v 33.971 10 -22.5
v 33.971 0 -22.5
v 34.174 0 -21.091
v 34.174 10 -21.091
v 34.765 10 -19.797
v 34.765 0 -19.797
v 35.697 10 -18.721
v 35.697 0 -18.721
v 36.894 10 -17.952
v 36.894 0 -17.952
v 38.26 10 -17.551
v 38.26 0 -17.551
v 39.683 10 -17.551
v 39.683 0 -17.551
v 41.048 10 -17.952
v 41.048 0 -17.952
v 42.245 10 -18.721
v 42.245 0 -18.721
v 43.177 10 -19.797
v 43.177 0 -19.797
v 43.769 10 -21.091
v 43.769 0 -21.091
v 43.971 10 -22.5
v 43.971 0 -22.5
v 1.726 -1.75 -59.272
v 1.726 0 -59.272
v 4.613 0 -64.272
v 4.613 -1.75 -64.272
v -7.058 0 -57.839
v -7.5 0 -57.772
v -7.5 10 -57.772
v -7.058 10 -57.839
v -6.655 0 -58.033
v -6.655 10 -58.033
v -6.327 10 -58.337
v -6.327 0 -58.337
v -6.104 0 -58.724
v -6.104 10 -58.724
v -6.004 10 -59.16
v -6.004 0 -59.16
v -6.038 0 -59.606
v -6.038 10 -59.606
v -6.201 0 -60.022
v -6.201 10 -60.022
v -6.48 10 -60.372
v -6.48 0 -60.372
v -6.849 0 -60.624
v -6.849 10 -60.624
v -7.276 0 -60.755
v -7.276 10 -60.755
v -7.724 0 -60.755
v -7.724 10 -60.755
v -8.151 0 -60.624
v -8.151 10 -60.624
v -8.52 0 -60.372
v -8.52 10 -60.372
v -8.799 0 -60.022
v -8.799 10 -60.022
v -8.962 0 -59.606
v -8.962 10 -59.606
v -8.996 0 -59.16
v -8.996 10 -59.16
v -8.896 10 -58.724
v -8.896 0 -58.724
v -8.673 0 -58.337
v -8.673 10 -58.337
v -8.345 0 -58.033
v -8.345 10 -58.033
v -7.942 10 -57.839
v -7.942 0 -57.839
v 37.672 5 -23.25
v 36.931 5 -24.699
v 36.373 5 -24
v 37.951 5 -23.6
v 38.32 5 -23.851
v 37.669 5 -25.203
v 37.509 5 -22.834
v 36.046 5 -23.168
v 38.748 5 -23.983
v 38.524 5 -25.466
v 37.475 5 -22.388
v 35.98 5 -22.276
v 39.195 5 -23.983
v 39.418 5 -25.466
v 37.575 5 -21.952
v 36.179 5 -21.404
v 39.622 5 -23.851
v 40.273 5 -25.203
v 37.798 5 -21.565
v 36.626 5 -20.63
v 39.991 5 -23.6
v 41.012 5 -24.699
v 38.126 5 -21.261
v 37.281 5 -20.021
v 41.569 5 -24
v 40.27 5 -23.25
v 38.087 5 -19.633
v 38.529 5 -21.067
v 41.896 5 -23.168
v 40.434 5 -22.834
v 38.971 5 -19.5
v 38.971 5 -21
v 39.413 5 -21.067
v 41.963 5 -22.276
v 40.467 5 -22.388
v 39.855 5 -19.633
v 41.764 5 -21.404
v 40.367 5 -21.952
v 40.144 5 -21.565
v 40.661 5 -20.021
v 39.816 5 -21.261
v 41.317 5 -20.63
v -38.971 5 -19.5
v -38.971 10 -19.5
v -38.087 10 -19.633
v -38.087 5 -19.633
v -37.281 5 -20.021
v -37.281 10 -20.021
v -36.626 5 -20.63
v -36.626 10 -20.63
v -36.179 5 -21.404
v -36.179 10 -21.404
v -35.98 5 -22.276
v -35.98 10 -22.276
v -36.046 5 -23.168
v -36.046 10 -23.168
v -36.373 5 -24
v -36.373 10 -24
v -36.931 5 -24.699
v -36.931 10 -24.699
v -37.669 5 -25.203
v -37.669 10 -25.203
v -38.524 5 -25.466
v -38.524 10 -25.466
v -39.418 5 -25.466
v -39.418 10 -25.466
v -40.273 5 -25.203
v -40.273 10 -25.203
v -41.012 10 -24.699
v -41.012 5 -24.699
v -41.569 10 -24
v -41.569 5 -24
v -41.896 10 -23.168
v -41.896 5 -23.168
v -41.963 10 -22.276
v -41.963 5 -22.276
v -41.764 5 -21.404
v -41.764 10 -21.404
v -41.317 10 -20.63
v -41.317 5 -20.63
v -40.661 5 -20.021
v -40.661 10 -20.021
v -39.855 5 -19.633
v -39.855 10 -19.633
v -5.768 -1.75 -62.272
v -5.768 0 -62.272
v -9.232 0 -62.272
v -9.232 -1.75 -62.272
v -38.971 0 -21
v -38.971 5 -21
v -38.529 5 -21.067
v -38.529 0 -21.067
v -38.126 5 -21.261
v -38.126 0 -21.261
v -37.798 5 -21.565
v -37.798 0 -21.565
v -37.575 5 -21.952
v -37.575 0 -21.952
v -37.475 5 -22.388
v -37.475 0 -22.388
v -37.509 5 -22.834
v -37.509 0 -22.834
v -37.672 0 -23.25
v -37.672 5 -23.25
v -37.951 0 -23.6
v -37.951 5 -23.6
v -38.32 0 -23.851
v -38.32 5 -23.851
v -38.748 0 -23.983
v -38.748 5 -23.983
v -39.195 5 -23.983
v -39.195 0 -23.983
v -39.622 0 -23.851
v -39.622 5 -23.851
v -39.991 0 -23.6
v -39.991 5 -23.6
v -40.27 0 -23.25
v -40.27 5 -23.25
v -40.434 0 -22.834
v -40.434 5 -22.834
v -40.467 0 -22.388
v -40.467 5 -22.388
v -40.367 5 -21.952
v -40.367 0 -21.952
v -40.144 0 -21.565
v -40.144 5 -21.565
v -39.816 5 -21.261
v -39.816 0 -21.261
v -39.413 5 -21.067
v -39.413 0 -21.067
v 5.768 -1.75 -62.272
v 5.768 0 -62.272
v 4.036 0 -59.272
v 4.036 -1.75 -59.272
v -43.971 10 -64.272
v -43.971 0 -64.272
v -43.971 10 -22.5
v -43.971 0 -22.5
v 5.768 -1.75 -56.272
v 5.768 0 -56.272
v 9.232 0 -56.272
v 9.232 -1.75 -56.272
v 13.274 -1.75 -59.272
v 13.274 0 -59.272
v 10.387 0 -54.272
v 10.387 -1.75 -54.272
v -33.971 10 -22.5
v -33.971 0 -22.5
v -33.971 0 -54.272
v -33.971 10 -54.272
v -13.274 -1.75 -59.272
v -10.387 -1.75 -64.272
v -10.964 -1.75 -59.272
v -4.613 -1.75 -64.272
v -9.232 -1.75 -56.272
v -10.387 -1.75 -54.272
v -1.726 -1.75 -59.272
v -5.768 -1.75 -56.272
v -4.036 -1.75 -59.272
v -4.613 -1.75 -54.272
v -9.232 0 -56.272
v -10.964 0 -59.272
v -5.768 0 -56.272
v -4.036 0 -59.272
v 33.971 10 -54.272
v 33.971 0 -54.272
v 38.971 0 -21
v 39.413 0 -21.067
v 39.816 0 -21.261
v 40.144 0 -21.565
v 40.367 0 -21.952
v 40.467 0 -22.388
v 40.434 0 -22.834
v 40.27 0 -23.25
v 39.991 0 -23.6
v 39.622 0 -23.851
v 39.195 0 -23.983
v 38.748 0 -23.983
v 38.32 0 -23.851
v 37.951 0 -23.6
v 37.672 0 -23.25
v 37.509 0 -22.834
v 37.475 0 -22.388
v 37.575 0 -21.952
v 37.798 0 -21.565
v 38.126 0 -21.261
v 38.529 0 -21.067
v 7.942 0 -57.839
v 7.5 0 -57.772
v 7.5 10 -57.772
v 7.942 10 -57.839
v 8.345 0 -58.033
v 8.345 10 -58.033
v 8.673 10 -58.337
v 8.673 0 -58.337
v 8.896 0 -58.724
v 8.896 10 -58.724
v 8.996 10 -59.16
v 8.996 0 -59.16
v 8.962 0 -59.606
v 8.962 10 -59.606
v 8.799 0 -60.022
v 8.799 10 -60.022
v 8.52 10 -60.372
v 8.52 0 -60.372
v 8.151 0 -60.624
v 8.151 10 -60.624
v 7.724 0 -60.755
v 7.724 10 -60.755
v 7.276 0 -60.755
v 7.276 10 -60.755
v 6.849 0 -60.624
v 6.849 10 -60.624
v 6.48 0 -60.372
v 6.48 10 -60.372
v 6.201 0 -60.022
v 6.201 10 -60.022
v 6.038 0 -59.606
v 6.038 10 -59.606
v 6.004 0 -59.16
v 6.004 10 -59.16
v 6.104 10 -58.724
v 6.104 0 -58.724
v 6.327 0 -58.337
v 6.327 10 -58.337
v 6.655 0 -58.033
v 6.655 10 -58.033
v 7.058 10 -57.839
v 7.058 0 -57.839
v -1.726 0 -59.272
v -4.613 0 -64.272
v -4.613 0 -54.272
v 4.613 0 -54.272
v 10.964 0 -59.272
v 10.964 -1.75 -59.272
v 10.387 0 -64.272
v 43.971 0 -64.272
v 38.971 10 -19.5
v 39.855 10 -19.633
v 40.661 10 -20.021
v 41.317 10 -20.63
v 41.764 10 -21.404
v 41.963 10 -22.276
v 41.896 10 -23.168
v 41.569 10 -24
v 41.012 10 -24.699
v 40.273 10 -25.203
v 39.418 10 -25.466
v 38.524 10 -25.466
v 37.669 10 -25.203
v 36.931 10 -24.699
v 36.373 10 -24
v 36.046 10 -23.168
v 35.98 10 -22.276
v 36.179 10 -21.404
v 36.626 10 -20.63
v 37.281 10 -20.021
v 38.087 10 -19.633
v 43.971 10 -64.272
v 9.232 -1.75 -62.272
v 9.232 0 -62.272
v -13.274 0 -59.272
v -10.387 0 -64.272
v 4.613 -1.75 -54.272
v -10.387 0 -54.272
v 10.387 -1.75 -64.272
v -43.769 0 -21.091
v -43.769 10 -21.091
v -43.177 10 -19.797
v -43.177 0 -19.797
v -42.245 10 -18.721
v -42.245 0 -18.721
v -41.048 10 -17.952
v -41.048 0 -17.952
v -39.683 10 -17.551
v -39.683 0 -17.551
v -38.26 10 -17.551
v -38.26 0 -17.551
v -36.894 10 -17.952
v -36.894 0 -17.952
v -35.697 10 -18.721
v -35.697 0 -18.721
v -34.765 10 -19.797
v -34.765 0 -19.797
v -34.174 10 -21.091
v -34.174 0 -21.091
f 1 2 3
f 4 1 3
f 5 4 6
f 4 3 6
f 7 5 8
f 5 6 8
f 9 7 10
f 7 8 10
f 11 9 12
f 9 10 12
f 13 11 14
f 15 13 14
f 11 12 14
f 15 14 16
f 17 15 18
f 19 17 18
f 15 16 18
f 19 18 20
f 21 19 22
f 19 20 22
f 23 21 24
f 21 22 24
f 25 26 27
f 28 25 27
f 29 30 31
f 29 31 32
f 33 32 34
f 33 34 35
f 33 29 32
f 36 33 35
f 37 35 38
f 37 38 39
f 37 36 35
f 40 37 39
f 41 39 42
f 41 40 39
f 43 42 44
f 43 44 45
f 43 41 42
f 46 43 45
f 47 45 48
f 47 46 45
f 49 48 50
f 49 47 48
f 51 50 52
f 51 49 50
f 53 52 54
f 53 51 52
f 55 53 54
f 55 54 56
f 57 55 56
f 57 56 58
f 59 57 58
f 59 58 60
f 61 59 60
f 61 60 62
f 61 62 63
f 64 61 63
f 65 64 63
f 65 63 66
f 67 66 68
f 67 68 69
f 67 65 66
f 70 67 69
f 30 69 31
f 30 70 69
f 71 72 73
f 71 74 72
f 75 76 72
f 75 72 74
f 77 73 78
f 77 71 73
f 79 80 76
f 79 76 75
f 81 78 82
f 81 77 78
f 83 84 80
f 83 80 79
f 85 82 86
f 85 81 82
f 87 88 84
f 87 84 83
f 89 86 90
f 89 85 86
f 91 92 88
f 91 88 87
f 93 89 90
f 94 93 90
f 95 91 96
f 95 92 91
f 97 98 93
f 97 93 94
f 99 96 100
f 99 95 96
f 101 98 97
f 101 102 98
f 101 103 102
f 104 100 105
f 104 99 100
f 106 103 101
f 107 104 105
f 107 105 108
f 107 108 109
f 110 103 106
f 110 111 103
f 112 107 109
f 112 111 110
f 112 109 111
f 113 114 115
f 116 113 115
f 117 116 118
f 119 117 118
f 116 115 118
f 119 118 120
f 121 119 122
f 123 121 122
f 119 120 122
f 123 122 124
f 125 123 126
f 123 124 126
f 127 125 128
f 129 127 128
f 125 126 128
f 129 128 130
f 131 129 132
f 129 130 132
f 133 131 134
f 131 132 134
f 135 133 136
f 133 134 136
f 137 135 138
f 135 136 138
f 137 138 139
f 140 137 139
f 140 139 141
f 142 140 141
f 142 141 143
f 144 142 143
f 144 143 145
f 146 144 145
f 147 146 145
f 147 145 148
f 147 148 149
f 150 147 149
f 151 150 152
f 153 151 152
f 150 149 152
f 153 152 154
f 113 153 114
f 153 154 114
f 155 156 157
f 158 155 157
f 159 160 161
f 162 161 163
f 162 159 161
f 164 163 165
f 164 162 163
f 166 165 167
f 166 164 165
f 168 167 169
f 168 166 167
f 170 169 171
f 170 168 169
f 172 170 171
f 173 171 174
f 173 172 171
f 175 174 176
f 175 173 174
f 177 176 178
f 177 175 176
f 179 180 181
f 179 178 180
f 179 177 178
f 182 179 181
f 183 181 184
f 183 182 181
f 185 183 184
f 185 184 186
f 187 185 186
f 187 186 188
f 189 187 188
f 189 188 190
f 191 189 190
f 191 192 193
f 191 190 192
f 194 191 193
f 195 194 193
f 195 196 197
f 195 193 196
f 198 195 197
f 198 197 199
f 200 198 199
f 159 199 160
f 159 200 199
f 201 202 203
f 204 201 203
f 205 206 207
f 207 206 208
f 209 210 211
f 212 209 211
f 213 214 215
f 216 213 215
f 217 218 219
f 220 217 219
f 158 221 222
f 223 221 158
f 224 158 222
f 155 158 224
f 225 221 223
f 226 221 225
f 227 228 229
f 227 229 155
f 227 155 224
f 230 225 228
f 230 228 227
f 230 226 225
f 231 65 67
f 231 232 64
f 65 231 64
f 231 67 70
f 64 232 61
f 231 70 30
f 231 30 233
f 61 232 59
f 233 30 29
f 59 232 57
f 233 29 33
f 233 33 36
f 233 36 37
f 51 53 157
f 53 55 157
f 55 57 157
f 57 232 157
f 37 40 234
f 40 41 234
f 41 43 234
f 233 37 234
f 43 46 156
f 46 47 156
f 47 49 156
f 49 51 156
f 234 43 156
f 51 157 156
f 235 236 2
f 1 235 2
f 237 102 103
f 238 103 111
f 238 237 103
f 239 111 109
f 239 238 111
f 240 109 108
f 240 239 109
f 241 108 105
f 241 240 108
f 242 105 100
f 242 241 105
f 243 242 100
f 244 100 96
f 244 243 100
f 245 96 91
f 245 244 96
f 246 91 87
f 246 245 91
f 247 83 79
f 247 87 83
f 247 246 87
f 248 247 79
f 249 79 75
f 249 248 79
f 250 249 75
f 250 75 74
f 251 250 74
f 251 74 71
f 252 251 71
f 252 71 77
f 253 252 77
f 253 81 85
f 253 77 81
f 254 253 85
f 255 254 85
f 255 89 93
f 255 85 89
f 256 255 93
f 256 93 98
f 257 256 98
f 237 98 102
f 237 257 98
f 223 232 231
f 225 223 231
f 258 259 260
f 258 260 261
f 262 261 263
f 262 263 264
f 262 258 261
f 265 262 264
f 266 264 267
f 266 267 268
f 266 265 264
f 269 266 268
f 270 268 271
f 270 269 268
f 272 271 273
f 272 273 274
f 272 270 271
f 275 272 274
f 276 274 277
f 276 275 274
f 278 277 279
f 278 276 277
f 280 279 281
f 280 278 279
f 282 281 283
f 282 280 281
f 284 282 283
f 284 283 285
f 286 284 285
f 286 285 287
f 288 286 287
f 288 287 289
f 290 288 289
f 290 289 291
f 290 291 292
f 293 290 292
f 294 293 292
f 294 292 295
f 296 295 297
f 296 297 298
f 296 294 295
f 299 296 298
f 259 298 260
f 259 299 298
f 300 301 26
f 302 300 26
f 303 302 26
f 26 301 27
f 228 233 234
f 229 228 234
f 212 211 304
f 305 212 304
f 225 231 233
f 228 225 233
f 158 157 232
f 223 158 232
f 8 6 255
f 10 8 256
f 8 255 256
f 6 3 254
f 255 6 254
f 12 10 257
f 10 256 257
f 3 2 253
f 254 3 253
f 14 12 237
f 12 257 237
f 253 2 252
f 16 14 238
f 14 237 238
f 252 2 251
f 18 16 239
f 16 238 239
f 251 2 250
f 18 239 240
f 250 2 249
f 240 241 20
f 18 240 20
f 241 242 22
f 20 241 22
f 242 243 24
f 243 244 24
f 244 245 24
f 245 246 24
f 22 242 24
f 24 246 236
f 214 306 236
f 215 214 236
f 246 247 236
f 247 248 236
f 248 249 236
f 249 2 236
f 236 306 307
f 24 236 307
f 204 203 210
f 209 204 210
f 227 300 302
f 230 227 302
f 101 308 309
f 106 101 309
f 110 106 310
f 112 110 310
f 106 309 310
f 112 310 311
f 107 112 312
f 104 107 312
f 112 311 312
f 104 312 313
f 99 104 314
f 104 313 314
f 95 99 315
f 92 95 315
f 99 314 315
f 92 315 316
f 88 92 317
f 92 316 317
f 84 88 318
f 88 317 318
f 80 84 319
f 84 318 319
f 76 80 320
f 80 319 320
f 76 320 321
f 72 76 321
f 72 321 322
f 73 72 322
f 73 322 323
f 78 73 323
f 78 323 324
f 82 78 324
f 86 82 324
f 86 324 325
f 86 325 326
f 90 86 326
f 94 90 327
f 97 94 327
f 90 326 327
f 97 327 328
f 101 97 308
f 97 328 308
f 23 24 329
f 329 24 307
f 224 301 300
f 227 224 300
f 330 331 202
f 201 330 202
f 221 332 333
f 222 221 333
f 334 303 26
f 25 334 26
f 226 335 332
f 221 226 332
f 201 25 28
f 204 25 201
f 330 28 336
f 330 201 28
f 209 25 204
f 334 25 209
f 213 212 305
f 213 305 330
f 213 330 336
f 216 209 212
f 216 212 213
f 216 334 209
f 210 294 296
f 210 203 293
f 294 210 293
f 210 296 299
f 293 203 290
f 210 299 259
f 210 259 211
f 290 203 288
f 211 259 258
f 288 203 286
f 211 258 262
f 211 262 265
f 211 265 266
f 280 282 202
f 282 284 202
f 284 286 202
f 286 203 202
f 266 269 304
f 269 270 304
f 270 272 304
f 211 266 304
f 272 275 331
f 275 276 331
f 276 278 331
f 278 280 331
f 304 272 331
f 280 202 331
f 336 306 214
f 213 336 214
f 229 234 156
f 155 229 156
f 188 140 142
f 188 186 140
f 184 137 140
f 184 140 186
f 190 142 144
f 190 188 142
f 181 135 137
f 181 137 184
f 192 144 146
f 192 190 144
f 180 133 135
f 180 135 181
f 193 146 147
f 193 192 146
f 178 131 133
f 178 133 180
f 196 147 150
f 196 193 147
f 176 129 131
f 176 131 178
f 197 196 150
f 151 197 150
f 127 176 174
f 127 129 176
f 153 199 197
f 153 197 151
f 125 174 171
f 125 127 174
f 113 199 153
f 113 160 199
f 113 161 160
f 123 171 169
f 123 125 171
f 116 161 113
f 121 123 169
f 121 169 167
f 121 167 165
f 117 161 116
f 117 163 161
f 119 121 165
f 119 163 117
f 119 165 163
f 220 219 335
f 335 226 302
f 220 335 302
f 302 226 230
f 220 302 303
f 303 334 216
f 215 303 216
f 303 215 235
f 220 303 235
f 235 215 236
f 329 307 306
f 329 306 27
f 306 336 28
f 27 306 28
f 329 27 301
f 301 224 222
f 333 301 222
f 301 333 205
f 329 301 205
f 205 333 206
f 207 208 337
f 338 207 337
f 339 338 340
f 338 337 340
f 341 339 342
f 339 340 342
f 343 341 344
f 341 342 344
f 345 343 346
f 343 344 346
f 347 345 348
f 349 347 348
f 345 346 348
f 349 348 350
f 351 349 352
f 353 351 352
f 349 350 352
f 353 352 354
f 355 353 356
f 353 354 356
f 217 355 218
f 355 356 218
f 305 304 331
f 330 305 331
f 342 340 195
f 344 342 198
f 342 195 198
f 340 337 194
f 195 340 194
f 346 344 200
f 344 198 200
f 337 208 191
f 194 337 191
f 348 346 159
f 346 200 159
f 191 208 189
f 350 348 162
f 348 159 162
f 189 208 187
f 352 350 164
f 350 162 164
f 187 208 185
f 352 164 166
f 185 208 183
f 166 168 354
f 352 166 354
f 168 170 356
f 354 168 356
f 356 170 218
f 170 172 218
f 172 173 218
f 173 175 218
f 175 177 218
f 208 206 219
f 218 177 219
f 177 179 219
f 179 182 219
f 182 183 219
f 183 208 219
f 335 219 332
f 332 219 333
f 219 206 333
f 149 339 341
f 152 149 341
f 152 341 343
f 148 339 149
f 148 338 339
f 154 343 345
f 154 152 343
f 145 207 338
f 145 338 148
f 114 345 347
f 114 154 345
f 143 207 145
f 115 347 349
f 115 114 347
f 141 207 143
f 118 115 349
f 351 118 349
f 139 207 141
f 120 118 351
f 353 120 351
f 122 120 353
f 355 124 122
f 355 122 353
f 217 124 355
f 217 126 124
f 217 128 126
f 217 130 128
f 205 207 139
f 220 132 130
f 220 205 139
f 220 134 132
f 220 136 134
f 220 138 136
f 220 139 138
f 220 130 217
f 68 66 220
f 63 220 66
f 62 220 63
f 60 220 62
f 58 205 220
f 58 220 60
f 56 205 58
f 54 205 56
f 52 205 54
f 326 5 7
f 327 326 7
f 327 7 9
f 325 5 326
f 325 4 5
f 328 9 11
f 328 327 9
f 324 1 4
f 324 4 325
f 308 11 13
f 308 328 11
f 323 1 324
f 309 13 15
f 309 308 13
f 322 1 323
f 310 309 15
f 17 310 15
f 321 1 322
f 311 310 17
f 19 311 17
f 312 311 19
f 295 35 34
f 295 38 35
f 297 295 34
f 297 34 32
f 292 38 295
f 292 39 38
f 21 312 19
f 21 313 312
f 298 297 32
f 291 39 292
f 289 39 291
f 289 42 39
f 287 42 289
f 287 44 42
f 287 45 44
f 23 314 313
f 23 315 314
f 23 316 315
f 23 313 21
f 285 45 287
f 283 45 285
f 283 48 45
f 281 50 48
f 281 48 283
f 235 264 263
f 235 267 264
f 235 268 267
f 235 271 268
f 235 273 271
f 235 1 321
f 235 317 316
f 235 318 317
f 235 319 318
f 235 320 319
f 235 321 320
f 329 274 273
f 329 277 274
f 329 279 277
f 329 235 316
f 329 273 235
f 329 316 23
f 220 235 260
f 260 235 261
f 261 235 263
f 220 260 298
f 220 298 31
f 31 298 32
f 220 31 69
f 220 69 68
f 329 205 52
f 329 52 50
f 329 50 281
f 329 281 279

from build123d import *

# Parameters (mm, degrees)
SKETCH1_R           = 1.5
BOSS_EXTRUDE1_DEPTH = 10
BOSS_EXTRUDE2_DEPTH = 1.75
SKETCH3_R           = 3
CUT_EXTRUDE1_DEPTH  = 5


with BuildPart() as part:
    # Sketch1 → Boss-Extrude1 (new body)
    with BuildSketch(Plane(origin=(0, 0, 0), x_dir=(1, 0, 0), z_dir=(0, 1, 0))):
        with BuildLine():
            ThreePointArc((-43.97114317, 22.5), (-38.97114317, 17.5), (-33.97114317, 22.5))
            Line((-33.97114317, 22.5), (-33.97114317, 54.272052467))
            Line((-33.97114317, 54.272052467), (33.97114317, 54.272052467))
            Line((33.97114317, 54.272052467), (33.97114317, 22.5))
            ThreePointArc((33.97114317, 22.5), (38.97114317, 17.5), (43.97114317, 22.5))
            Line((43.97114317, 22.5), (43.97114317, 64.272052467))
            Line((43.97114317, 64.272052467), (-43.97114317, 64.272052467))
            Line((-43.97114317, 64.272052467), (-43.97114317, 22.5))
        make_face()
        with Locations(Location((-38.97114317, 22.5, 0), (0, 0, 270))):
            Circle(SKETCH1_R, mode=Mode.SUBTRACT)
        with Locations(Location((38.97114317, 22.5, 0), (0, 0, 270))):
            Circle(SKETCH1_R, mode=Mode.SUBTRACT)
        with Locations(Location((7.5, 59.272052467, 0), (0, 0, 270))):
            Circle(SKETCH1_R, mode=Mode.SUBTRACT)
        with Locations(Location((-7.5, 59.272052467, 0), (0, 0, 270))):
            Circle(SKETCH1_R, mode=Mode.SUBTRACT)
    extrude(amount=BOSS_EXTRUDE1_DEPTH)

    # Sketch2 → Boss-Extrude2 (add)
    # profile 1 of 2: a face of its own
    with BuildSketch(Plane.XZ):
        Polygon((-1.726497308, -59.272052467), (-4.613248654, -54.272052467), (-10.386751346, -54.272052467), (-13.273502692, -59.272052467), (-10.386751346, -64.272052467), (-4.613248654, -64.272052467), align=None)
        Polygon((-9.232050808, -56.272052467), (-5.767949192, -56.272052467), (-4.035898385, -59.272052467), (-5.767949192, -62.272052467), (-9.232050808, -62.272052467), (-10.964101615, -59.272052467), align=None, mode=Mode.SUBTRACT)
    # profile 2 of 2: a face of its own
    with BuildSketch(Plane.XZ):
        Polygon((10.386751346, -54.272052467), (4.613248654, -54.272052467), (1.726497308, -59.272052467), (4.613248654, -64.272052467), (10.386751346, -64.272052467), (13.273502692, -59.272052467), align=None)
        Polygon((5.767949192, -56.272052467), (9.232050808, -56.272052467), (10.964101615, -59.272052467), (9.232050808, -62.272052467), (5.767949192, -62.272052467), (4.035898385, -59.272052467), align=None, mode=Mode.SUBTRACT)
    extrude(amount=BOSS_EXTRUDE2_DEPTH)

    # Sketch3 → Cut-Extrude1 (cut)
    with BuildSketch(Plane(origin=(0, 10, 0), x_dir=(1, 0, 0), z_dir=(0, 1, 0))):
        with Locations(Location((-38.97114317, 22.5, 0), (0, 0, 270))):
            Circle(SKETCH3_R)
        with Locations(Location((38.97114317, 22.5, 0), (0, 0, 270))):
            Circle(SKETCH3_R)
    extrude(amount=-CUT_EXTRUDE1_DEPTH, mode=Mode.SUBTRACT)


solid = part.part
